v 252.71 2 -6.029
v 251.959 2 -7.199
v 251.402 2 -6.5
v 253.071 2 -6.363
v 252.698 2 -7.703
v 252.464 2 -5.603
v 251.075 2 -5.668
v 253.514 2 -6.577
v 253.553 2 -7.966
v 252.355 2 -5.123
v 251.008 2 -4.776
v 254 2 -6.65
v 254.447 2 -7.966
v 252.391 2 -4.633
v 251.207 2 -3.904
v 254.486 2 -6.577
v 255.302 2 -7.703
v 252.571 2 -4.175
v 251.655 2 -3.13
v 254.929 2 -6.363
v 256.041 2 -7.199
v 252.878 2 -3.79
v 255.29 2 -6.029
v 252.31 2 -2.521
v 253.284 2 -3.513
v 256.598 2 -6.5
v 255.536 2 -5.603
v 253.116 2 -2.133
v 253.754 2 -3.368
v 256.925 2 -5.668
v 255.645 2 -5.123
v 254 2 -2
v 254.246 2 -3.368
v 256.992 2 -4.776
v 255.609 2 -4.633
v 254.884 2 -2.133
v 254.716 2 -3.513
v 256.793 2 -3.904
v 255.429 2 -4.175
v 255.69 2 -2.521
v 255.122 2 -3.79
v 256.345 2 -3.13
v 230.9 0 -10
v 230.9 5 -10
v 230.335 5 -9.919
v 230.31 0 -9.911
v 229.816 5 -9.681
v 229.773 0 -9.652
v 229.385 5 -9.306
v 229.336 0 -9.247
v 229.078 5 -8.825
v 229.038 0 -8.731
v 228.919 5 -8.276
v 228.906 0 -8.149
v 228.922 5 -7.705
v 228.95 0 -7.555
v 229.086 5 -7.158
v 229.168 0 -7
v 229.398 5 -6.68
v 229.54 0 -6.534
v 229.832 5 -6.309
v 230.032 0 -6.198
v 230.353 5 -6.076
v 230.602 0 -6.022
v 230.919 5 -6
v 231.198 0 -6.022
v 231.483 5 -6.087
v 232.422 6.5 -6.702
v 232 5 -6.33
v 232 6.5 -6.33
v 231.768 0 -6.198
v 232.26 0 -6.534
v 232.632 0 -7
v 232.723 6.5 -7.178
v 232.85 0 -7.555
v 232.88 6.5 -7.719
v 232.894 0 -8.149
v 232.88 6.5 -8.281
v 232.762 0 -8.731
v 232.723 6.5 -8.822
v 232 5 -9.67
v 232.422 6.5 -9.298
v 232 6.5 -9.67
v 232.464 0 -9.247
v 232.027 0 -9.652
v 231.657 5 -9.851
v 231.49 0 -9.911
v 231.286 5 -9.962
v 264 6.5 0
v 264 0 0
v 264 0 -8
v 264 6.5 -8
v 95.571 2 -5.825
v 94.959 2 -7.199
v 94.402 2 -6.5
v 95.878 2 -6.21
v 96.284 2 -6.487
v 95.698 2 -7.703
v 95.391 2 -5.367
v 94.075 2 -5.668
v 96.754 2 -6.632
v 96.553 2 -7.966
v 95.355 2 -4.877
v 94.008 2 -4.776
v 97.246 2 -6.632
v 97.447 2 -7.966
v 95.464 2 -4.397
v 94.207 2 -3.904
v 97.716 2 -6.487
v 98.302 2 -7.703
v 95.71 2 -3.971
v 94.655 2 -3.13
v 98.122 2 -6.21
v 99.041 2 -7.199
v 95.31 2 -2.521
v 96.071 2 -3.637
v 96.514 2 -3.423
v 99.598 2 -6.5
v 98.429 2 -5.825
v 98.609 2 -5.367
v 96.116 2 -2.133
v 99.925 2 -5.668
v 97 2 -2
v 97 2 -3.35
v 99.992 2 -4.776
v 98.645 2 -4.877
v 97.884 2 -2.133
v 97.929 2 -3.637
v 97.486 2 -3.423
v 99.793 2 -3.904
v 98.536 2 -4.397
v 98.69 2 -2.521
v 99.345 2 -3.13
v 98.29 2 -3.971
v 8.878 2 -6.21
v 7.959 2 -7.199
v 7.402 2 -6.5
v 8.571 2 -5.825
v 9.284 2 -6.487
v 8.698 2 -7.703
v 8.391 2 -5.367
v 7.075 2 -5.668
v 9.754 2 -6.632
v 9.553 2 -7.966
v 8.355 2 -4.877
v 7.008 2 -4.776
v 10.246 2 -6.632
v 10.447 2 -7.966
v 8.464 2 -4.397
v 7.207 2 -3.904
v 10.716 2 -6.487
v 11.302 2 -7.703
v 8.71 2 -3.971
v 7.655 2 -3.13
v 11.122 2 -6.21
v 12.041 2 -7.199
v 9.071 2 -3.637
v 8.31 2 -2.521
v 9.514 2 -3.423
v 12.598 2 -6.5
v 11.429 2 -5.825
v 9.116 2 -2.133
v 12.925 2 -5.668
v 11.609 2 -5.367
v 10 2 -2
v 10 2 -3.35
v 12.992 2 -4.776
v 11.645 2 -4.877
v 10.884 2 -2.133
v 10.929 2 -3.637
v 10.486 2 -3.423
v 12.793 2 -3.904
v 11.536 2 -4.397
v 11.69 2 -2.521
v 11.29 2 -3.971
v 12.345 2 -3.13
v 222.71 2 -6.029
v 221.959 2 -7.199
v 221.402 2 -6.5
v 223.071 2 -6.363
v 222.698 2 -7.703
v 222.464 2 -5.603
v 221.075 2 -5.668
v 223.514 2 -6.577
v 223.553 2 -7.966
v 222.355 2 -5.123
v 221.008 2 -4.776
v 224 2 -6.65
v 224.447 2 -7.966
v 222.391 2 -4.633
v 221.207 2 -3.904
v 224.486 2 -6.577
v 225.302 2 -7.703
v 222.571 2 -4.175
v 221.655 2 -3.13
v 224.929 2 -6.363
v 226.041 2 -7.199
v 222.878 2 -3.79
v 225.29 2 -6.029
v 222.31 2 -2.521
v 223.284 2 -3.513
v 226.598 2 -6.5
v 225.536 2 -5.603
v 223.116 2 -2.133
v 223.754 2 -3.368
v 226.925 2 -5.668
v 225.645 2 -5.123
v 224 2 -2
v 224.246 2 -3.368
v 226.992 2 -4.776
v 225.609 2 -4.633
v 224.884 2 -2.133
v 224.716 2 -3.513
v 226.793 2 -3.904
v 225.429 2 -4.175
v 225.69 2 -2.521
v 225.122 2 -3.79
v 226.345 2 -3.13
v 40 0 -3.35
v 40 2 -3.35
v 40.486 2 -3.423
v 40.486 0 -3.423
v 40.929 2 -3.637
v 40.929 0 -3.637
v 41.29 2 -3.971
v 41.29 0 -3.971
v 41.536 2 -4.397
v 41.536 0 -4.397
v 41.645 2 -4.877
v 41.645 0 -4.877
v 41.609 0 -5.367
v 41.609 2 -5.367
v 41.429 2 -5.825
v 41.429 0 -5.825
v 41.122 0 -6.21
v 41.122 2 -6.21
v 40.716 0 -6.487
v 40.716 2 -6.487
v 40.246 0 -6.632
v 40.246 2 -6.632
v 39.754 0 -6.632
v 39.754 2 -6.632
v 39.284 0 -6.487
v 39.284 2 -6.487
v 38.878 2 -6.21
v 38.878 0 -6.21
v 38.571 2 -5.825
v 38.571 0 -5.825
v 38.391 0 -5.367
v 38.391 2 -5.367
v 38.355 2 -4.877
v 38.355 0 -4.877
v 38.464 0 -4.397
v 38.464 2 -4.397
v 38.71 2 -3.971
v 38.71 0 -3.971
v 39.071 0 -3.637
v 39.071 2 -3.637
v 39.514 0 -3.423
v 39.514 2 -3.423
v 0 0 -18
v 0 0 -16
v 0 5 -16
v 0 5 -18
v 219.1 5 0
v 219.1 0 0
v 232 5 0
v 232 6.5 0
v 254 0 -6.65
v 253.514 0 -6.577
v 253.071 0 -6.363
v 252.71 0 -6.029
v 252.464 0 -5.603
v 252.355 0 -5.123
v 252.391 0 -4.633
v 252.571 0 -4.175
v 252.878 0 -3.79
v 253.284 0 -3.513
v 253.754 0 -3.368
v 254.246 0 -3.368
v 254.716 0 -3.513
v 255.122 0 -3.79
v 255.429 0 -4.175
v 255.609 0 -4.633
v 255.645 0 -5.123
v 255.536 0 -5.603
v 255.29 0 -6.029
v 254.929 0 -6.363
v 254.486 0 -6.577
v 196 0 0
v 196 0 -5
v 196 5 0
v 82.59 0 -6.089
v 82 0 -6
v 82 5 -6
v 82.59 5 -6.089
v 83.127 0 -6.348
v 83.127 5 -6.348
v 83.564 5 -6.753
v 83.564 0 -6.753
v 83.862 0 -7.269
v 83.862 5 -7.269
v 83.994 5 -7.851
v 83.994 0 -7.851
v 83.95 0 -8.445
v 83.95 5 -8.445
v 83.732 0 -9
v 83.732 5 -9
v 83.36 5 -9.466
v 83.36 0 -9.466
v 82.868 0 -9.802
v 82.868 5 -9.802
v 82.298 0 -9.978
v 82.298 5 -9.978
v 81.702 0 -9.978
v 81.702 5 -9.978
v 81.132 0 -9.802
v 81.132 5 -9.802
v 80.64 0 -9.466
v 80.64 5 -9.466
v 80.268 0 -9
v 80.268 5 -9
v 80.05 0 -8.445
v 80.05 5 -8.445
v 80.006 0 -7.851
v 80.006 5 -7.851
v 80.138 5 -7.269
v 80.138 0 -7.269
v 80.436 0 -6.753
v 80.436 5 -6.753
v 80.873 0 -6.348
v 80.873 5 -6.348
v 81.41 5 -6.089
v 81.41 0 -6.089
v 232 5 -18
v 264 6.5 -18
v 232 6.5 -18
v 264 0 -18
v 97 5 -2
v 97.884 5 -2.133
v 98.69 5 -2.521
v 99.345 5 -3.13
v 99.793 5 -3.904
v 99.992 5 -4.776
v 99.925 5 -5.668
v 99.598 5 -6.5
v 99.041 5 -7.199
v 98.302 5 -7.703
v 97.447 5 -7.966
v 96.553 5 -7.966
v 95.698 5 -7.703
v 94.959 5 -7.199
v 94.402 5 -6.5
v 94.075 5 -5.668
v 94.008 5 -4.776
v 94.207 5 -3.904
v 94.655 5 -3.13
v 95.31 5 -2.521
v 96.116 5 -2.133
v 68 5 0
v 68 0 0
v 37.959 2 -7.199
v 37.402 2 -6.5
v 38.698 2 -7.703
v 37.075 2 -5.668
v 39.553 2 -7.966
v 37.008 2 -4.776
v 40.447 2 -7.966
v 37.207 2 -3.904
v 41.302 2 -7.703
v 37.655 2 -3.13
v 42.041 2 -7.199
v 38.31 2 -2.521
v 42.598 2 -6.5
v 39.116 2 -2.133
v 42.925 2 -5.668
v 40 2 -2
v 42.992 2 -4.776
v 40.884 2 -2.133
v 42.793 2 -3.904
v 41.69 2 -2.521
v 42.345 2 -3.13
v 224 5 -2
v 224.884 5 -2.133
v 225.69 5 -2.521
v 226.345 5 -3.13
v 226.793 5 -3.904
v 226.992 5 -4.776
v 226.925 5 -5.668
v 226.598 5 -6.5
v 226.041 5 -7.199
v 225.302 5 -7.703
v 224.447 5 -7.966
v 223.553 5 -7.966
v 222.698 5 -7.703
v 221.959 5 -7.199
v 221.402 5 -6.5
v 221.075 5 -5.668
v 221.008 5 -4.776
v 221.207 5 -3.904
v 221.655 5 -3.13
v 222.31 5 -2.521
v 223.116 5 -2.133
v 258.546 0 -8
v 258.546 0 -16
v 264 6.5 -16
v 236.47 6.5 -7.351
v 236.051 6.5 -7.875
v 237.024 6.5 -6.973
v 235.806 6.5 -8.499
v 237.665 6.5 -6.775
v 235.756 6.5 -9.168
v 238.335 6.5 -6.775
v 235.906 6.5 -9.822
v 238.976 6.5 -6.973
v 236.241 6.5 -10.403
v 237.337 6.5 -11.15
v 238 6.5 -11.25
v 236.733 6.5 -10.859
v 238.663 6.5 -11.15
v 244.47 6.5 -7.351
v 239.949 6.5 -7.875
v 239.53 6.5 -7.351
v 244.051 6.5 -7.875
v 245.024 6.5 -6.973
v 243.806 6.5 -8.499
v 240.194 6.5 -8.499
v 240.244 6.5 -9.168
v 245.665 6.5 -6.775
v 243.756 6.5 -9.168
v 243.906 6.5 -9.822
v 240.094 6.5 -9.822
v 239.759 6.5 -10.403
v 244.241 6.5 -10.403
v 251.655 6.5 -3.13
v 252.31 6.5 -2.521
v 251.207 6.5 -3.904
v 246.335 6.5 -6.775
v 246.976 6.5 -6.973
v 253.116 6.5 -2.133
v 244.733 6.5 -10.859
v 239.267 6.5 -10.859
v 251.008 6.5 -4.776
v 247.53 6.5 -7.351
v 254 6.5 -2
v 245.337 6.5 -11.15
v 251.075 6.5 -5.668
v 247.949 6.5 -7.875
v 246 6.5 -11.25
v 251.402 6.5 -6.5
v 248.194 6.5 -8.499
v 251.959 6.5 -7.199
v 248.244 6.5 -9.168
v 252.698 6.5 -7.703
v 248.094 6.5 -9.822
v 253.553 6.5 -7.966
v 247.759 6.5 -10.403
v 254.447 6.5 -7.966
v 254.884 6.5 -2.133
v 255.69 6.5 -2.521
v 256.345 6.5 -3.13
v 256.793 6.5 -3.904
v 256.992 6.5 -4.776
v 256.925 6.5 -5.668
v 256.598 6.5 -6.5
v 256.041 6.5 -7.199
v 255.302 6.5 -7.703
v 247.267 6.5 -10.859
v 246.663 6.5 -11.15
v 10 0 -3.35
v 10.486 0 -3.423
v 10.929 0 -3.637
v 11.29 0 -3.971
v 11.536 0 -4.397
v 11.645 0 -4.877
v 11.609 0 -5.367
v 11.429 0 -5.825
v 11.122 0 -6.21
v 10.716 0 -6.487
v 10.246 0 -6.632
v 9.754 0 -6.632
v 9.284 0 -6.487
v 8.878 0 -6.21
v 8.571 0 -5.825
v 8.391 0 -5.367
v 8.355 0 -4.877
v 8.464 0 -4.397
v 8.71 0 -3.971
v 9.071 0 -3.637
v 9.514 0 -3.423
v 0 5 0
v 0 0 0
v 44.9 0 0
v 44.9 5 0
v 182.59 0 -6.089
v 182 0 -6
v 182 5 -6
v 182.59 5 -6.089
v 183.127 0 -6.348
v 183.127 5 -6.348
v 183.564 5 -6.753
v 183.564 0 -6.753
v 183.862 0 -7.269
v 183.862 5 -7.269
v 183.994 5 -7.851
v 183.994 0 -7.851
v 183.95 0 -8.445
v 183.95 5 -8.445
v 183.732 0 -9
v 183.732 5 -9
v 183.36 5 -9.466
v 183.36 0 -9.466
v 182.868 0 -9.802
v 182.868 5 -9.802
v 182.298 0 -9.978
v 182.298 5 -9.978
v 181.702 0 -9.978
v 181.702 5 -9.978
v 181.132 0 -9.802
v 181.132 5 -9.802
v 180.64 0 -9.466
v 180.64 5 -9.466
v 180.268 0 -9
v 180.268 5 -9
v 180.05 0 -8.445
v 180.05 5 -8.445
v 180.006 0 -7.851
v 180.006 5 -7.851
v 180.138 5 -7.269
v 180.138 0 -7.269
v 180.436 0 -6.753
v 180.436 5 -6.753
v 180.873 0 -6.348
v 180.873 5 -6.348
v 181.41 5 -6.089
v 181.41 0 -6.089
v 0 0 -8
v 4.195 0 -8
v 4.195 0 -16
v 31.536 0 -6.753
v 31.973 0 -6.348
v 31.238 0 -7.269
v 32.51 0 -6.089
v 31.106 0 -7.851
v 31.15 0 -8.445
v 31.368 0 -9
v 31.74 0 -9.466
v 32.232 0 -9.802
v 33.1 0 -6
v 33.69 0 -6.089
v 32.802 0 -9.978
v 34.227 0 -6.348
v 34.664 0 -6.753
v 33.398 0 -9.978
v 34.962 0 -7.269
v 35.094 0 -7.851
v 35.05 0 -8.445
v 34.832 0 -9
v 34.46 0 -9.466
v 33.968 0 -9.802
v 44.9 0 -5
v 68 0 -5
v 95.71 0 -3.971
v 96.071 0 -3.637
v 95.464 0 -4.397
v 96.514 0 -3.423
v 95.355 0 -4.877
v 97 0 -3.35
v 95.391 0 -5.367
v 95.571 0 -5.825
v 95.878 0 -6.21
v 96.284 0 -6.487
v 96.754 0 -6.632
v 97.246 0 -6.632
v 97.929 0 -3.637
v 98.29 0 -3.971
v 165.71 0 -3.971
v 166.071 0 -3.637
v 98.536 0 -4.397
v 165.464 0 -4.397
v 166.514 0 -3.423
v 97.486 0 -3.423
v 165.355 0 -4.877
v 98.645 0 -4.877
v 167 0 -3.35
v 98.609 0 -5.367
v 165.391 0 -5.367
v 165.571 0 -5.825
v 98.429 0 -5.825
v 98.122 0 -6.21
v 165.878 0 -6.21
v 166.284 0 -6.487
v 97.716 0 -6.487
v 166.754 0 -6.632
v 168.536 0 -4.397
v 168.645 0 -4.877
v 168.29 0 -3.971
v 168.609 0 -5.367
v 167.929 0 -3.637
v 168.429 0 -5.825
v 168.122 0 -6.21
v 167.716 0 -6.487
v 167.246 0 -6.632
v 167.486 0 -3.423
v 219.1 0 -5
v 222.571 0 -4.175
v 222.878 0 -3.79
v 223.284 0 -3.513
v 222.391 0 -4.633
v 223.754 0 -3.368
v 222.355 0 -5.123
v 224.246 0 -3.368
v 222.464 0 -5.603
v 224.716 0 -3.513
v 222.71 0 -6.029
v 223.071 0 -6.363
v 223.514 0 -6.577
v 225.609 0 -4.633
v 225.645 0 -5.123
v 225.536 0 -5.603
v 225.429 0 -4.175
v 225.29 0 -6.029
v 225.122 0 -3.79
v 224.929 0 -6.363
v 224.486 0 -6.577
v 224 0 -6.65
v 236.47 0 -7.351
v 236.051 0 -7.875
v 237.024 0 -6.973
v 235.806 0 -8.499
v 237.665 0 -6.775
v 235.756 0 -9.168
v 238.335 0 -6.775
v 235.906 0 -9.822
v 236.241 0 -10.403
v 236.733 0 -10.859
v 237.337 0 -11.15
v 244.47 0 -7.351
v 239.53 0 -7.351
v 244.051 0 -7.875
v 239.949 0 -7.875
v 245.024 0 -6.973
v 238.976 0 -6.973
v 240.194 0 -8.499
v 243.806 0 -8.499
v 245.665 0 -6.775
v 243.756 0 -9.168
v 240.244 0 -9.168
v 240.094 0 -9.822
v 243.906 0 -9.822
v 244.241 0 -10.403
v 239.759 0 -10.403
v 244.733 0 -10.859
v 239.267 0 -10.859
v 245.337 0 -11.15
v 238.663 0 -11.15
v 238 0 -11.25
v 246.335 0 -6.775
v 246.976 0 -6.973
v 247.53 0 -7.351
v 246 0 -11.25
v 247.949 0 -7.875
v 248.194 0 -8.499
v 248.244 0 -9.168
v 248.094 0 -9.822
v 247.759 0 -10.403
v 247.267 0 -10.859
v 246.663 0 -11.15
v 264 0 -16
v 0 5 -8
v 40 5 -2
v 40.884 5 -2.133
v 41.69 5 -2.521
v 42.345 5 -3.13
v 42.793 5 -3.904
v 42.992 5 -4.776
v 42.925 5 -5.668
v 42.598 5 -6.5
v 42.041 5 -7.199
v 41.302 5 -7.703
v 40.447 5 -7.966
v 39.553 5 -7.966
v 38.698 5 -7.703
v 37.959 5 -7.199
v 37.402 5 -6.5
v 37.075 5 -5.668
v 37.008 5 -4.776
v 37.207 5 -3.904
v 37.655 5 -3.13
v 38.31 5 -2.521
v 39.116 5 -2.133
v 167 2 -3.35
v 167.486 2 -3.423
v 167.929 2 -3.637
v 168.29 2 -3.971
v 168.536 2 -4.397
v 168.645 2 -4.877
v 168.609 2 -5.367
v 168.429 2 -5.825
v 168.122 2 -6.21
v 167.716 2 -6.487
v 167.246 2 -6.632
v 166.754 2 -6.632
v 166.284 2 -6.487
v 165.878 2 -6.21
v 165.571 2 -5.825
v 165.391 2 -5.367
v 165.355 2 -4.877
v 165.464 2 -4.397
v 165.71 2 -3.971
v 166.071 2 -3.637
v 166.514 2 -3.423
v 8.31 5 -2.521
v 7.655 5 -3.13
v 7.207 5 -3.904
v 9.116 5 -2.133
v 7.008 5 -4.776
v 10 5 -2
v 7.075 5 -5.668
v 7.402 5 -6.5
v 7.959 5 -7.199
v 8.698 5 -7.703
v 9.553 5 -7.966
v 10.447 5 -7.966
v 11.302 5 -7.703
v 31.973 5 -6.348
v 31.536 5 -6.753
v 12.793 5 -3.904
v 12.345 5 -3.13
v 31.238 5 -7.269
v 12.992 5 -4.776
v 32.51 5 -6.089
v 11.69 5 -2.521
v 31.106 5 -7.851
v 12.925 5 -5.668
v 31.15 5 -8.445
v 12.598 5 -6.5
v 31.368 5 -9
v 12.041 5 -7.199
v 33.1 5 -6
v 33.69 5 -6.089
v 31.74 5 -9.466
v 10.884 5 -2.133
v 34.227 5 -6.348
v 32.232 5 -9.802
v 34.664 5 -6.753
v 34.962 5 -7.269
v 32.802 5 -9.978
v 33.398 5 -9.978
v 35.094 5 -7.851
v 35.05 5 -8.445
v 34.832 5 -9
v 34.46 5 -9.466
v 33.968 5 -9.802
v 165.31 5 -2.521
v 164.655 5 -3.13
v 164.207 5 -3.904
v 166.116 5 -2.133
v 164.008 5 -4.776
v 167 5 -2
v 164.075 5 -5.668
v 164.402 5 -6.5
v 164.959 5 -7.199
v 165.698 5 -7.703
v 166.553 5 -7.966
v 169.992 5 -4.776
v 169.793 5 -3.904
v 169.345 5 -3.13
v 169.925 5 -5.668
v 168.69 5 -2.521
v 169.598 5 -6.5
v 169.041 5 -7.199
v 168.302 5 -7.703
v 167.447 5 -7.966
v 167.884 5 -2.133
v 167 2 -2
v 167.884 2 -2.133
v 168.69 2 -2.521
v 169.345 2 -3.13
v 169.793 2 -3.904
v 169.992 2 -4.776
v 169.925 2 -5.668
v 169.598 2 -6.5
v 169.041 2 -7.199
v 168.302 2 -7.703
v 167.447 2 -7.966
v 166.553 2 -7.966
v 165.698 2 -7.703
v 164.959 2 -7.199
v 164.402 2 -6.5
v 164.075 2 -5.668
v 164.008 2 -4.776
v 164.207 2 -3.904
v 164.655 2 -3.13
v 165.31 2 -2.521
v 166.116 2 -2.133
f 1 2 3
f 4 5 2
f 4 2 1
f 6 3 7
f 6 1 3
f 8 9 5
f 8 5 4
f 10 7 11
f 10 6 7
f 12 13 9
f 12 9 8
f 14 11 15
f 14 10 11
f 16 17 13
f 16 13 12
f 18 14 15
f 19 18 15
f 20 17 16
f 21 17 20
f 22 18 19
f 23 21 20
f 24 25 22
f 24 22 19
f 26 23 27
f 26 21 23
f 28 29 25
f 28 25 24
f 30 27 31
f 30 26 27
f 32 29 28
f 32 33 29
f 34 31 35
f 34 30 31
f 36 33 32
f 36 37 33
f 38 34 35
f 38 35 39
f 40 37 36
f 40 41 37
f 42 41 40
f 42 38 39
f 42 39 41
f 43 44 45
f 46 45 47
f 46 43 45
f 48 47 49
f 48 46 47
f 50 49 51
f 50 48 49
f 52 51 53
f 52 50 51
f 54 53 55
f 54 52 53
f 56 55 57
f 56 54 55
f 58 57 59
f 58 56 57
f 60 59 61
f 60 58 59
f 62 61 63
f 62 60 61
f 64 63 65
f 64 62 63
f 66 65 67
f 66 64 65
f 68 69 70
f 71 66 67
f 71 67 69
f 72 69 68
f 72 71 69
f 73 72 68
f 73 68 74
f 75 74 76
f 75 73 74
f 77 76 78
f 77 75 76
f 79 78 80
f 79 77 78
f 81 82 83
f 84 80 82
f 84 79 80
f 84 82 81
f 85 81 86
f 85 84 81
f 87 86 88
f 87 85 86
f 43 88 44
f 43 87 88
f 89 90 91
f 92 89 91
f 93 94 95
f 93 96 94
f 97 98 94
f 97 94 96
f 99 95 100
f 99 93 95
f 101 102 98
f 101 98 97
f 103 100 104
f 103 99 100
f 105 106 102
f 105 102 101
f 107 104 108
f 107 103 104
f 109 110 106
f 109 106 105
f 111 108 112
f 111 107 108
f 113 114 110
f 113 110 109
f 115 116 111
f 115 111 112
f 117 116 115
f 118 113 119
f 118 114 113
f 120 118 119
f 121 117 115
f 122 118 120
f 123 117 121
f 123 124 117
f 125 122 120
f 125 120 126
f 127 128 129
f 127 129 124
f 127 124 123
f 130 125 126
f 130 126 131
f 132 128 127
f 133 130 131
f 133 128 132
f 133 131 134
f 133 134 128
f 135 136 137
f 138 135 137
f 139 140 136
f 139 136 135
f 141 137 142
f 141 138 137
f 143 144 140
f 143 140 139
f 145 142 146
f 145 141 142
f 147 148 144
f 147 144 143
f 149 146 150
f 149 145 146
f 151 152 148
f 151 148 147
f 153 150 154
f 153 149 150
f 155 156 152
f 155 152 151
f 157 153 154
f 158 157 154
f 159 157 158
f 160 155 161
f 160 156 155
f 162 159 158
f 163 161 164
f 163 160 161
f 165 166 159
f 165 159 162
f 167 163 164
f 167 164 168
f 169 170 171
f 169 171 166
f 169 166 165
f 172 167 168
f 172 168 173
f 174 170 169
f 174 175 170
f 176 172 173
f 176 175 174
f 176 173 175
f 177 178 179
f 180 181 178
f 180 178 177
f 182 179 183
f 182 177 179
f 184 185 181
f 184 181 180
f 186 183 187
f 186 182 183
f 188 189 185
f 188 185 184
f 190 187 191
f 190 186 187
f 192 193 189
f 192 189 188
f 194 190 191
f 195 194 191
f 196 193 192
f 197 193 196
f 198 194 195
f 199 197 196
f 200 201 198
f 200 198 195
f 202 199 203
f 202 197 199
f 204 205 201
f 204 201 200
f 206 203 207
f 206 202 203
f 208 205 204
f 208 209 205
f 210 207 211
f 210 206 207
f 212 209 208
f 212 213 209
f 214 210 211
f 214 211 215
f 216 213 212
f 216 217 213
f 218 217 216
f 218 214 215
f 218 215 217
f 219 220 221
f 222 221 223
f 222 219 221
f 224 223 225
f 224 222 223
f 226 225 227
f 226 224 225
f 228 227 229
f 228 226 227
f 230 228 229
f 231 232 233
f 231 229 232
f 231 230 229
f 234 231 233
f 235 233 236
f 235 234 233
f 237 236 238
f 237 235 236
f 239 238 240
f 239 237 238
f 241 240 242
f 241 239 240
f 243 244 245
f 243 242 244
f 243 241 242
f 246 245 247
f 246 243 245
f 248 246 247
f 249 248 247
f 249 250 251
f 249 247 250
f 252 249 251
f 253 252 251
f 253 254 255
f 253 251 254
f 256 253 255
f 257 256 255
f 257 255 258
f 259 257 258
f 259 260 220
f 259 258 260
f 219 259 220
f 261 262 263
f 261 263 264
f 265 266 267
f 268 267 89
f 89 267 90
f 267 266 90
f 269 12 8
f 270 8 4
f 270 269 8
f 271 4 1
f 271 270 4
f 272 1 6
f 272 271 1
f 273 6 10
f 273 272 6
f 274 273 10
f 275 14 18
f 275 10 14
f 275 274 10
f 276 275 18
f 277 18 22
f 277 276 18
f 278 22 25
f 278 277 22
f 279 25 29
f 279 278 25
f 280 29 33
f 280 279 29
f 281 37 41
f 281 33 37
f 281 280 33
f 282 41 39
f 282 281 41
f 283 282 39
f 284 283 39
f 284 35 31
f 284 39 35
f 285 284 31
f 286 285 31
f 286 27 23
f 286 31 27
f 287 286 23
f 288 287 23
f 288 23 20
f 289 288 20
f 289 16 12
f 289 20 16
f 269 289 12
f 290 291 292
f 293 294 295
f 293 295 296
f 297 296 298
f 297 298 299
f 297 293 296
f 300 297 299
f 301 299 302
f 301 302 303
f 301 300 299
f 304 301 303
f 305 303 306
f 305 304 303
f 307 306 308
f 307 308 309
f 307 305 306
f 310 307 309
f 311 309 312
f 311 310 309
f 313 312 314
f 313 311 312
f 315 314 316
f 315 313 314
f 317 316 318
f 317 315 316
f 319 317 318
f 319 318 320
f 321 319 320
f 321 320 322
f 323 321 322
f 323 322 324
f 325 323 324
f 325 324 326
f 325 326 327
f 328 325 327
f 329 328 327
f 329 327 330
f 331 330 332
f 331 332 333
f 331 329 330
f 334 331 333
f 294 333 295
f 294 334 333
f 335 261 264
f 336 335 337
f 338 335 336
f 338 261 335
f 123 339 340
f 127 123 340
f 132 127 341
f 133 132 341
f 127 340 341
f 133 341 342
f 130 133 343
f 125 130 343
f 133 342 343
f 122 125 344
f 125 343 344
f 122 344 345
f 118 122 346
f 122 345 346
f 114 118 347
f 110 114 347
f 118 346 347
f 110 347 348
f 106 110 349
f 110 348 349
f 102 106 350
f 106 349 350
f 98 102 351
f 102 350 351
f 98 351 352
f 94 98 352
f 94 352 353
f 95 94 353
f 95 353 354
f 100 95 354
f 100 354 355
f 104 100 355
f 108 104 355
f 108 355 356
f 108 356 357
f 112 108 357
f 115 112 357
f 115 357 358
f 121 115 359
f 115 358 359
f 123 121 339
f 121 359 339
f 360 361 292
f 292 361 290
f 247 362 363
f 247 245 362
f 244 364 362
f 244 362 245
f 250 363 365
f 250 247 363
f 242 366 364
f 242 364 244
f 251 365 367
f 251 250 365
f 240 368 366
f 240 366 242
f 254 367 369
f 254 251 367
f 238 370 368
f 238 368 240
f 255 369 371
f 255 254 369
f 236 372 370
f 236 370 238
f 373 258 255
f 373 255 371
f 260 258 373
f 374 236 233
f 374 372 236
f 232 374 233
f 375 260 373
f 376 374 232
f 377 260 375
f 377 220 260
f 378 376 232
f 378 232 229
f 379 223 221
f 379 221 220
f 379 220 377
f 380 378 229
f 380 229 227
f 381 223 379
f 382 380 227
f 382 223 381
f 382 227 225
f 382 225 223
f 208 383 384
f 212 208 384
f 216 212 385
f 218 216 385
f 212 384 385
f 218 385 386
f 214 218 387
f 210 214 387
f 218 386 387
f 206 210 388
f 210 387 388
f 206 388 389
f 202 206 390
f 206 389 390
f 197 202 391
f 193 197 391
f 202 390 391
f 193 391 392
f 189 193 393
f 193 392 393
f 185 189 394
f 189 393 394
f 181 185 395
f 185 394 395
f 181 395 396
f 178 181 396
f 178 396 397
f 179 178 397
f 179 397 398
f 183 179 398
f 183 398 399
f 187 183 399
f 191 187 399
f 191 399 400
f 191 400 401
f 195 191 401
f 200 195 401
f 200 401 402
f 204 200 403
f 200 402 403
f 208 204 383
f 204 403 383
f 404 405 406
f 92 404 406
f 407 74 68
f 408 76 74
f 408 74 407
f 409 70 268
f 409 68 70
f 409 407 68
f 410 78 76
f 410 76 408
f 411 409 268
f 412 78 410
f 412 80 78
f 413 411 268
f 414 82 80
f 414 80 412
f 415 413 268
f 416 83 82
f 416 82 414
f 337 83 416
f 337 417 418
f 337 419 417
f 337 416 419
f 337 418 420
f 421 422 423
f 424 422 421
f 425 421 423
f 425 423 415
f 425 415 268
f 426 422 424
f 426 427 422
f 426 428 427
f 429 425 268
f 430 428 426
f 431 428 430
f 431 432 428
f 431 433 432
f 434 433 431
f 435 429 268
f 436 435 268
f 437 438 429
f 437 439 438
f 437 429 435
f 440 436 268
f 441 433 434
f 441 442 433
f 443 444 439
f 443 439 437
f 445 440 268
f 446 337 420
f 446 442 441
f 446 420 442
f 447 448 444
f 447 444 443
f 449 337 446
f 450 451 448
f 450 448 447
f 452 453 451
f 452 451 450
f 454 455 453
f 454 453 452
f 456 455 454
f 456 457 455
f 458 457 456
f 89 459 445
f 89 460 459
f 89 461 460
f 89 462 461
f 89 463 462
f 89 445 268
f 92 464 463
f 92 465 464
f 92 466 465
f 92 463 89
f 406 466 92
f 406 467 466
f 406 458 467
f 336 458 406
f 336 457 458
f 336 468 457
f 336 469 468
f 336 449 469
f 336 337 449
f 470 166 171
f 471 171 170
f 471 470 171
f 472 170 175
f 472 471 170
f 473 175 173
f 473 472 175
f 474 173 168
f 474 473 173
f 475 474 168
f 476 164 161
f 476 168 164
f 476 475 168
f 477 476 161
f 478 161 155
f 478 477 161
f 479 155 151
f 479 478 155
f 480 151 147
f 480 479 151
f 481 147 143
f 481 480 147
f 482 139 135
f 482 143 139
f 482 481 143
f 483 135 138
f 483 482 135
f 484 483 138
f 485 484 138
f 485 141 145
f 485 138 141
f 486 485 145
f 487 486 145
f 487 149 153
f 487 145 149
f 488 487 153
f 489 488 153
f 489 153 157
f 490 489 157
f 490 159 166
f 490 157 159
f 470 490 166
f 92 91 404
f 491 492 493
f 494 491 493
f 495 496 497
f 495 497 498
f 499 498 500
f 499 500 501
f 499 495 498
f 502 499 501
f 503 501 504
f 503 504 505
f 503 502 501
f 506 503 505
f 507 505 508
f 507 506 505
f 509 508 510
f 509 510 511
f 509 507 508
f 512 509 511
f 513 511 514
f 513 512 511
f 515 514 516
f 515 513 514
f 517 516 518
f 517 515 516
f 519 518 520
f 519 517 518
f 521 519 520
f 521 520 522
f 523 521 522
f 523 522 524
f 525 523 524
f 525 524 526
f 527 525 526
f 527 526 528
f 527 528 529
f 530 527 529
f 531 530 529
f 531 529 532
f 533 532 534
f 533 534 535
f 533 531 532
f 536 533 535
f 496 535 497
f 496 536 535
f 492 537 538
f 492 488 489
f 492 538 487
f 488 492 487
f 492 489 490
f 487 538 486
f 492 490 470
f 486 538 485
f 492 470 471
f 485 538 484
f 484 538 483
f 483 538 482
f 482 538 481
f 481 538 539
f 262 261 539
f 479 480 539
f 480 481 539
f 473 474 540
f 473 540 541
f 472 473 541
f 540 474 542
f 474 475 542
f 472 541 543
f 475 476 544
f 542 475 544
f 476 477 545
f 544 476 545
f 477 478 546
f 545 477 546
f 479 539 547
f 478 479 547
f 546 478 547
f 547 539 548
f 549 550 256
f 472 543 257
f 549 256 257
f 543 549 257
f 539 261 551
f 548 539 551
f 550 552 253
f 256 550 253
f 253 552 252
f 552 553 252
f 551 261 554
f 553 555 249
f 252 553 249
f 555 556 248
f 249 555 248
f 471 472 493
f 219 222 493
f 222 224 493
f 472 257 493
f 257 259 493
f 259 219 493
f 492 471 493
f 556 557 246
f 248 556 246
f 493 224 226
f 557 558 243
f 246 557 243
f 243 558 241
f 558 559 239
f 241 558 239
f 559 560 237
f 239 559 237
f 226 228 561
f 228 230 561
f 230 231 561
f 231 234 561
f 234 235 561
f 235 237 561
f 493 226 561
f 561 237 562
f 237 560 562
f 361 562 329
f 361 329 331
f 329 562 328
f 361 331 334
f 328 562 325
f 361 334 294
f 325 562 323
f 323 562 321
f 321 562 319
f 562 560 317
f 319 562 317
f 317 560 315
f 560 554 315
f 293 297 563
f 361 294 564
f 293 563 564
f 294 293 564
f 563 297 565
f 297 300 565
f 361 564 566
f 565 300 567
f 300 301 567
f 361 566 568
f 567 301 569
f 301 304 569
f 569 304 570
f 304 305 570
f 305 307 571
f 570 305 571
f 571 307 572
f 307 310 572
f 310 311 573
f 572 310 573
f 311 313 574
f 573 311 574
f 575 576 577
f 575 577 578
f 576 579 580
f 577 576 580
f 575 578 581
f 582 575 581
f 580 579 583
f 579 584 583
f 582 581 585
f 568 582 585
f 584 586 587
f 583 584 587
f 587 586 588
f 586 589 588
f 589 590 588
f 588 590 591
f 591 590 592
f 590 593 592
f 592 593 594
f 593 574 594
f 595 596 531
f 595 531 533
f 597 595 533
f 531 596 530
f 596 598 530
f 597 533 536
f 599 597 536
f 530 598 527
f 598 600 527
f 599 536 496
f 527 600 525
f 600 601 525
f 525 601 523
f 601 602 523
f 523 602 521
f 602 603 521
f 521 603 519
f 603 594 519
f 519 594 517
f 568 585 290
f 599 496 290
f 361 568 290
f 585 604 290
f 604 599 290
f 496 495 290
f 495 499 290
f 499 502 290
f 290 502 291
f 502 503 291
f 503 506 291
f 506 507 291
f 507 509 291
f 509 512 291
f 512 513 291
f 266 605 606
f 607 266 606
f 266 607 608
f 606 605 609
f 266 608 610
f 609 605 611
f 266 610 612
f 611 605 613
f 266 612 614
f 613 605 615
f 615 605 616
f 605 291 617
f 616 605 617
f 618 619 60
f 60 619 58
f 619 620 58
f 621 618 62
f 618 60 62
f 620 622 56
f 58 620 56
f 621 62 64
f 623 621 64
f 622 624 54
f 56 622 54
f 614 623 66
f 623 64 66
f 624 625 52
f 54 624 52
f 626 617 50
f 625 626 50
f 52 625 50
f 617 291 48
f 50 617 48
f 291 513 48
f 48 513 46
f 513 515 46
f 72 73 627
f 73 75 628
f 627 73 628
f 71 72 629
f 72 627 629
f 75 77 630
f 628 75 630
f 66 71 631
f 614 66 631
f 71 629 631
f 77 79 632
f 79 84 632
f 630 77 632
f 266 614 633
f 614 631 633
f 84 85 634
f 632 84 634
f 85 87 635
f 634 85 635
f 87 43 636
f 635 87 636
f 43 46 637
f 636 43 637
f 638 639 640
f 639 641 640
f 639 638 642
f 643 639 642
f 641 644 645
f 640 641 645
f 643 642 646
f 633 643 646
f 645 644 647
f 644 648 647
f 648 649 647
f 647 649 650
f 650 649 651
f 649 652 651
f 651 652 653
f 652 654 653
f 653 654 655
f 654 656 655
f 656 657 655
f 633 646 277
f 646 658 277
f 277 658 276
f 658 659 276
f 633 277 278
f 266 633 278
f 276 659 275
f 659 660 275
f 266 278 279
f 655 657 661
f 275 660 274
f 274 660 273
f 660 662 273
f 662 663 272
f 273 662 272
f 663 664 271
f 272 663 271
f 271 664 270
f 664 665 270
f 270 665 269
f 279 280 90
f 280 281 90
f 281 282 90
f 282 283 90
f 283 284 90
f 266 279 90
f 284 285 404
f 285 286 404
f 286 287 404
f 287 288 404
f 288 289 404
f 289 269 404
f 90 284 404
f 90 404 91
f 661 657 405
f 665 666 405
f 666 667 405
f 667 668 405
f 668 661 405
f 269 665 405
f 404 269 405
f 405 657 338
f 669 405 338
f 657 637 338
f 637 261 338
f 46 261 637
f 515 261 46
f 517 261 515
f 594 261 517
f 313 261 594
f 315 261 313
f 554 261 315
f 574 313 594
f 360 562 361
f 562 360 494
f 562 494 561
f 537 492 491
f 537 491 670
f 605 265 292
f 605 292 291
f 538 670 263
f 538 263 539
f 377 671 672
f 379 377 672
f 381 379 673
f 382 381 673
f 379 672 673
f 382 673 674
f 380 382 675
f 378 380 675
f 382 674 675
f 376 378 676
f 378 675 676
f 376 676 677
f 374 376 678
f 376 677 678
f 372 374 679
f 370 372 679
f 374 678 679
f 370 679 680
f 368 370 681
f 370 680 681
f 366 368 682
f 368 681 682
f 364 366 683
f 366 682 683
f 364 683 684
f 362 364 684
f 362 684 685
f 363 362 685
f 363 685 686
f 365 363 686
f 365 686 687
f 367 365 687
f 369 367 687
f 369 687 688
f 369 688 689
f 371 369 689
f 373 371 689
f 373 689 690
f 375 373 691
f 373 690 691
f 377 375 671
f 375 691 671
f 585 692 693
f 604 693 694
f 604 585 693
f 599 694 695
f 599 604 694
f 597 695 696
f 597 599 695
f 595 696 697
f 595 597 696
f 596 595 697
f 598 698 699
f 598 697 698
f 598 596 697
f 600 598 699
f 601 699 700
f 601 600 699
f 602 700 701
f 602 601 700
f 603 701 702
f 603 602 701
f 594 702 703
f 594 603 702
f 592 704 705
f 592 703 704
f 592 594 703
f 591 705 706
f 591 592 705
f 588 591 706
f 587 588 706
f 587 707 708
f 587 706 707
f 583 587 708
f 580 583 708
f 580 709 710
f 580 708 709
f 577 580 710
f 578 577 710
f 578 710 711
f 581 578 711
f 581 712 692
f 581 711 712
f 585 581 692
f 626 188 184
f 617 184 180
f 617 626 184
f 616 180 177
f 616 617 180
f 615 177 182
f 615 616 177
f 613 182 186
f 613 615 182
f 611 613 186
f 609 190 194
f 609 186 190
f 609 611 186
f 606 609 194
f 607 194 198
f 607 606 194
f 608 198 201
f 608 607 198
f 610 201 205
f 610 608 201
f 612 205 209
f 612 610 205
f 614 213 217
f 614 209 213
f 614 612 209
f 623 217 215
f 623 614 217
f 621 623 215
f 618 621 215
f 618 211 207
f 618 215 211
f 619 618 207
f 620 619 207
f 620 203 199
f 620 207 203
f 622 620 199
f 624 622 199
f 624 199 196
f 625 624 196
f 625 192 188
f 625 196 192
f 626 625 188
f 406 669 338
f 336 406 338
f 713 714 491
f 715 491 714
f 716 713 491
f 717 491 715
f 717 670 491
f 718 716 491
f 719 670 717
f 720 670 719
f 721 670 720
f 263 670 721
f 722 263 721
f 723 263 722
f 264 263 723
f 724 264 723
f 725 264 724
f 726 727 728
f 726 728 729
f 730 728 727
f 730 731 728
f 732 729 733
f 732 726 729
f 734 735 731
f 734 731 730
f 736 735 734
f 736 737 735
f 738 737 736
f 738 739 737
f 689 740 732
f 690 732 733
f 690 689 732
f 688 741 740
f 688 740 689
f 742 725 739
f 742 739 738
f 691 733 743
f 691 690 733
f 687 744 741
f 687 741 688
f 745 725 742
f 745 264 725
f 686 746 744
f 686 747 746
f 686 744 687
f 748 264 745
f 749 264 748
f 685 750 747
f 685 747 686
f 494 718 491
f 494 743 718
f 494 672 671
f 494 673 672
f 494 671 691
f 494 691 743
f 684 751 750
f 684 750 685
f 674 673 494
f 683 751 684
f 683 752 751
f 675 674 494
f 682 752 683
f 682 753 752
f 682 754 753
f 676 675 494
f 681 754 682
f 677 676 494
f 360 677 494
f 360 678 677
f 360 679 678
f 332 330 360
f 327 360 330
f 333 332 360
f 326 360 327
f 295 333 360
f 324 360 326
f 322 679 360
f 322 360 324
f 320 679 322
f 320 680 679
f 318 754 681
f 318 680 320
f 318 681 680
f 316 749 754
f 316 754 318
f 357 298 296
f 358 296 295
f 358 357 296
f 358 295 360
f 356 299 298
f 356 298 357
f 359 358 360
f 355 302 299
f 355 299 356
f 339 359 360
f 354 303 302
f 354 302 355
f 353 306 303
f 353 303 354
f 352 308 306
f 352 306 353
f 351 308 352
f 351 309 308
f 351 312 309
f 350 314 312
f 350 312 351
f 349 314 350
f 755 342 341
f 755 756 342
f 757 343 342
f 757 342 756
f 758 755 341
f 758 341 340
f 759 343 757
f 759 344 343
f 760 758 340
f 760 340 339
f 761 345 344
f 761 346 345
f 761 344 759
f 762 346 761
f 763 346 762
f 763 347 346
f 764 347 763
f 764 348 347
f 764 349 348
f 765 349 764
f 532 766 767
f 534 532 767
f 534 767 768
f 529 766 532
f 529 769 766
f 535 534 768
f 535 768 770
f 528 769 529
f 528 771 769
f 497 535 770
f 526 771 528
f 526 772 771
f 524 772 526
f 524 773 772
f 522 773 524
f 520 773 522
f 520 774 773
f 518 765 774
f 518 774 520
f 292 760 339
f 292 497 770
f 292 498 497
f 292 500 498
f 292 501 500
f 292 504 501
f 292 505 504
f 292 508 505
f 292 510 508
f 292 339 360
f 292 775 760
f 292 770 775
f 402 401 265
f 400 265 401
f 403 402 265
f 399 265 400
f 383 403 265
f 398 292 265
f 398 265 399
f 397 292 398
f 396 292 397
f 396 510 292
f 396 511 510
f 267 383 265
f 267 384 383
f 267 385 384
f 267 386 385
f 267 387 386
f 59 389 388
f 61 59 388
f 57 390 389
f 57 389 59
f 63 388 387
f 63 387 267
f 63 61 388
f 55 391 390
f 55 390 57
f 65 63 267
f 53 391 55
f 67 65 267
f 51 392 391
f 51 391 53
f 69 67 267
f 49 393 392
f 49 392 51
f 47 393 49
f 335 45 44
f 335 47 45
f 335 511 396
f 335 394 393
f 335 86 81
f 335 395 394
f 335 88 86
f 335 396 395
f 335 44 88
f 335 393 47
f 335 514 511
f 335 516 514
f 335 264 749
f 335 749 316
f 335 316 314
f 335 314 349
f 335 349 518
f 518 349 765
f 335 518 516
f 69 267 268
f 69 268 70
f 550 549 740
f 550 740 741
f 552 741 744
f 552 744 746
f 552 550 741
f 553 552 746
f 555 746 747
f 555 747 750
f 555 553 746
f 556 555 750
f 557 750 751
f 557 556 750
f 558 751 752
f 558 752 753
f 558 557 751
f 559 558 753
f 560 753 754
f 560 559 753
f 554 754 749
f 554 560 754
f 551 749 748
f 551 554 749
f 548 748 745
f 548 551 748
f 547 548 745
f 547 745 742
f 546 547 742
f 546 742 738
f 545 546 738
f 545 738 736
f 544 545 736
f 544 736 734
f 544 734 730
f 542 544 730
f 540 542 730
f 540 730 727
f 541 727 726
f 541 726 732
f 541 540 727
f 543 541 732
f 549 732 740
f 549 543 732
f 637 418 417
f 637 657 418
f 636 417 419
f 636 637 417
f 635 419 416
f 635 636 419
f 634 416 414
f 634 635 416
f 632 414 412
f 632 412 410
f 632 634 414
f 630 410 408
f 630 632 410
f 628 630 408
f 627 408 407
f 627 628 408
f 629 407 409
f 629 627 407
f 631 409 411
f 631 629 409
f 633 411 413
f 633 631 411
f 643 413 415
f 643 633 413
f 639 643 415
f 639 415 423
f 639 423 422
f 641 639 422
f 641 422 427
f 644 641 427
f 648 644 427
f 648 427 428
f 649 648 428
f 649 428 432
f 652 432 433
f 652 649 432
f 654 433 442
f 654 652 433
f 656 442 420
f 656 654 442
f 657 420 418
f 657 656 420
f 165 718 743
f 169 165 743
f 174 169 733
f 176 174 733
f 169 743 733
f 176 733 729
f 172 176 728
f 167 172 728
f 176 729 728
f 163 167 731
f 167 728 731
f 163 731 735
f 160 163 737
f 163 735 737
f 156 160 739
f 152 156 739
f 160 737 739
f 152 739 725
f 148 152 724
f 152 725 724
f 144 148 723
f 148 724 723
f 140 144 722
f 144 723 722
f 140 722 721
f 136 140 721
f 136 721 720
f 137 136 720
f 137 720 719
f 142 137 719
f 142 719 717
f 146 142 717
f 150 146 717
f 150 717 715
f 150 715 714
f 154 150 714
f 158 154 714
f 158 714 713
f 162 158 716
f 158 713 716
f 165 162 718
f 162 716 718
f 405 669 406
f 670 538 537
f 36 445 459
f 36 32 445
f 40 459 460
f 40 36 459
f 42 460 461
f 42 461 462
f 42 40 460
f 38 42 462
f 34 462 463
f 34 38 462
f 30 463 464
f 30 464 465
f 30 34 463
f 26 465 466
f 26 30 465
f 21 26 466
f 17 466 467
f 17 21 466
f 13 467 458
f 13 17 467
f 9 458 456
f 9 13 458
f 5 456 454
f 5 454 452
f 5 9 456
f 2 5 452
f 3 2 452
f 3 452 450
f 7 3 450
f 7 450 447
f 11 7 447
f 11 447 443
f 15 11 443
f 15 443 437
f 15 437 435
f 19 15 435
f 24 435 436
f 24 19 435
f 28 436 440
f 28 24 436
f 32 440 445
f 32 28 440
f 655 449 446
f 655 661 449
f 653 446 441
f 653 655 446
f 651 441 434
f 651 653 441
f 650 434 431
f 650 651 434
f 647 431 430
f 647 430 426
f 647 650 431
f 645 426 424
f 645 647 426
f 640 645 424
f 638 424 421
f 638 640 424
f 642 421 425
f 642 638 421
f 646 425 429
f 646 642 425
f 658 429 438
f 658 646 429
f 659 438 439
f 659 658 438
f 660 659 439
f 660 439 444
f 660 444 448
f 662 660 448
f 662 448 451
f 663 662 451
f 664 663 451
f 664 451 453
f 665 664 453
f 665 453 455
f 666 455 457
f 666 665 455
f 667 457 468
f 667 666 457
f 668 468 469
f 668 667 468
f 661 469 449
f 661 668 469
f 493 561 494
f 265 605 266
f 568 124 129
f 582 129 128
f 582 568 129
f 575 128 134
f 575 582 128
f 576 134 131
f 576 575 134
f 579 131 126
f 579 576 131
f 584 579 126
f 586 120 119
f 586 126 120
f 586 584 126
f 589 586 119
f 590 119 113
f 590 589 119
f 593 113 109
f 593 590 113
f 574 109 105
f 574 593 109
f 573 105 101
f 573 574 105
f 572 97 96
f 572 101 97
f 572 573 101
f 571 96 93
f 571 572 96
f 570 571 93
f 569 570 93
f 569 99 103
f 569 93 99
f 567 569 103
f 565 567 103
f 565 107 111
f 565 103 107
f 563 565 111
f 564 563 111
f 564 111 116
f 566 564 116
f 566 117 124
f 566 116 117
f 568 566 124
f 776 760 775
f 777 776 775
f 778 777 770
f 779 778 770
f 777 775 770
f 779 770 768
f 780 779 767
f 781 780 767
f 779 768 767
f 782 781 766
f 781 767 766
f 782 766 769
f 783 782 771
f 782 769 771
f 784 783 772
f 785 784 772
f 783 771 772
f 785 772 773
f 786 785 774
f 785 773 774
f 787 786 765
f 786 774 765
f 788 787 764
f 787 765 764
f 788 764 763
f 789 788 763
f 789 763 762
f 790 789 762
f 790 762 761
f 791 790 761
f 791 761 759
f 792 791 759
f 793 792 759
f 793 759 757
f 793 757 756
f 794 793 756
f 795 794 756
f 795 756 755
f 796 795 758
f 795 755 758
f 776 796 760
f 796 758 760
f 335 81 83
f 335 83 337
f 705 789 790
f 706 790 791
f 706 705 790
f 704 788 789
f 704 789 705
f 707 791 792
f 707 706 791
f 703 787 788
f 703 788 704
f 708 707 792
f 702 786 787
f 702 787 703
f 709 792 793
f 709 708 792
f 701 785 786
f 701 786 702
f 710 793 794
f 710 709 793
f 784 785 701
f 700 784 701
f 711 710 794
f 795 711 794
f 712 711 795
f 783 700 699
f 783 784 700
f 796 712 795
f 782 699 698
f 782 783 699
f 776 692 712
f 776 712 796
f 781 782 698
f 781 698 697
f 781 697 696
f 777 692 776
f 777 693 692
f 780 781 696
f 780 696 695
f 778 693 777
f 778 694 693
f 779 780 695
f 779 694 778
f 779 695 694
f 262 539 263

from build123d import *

# Parameters (mm, degrees)
SKIZZE1_W                       = 264
SKIZZE1_H                       = 18
SKIZZE1_R                       = 1.65
SKIZZE1_R_2                     = 2.25
SKIZZE1_R_3                     = 2
AUFSATZ_LINEAR_AUSTRAGEN1_DEPTH = 5
SCHNITT_LINEAR_START            = -2
SCHNITT_LINEAR_AUSTRAGEN1_DEPTH = 8
SCHNITT_LINEAR_START_2          = -44.9
SCHNITT_LINEAR_AUSTRAGEN2_DEPTH = 23.1
SCHNITT_LINEAR_AUSTRAGEN3_DEPTH = 23.1
SKIZZE5_R                       = 3
SCHNITT_LINEAR_AUSTRAGEN4_DEPTH = 3
SKIZZE7_W                       = 32
SKIZZE7_H                       = 18
SKIZZE7_R                       = 2.25
SKIZZE7_R_2                     = 3
AUFSATZ_LINEAR_AUSTRAGEN3_DEPTH = 1.5
AUFSATZ_LINEAR_START            = -5
SKIZZE8_R                       = 2.25
AUFSATZ_LINEAR_AUSTRAGEN4_DEPTH = 5
SCHNITT_LINEAR_AUSTRAGEN6_DEPTH = 8
SKIZZE10_R                      = 2
SCHNITT_LINEAR_AUSTRAGEN7_DEPTH = 1.5


with BuildPart() as part:
    # Skizze1 → Aufsatz-Linear austragen1 (new body)
    with BuildSketch(Plane(origin=(0, 0, 0), x_dir=(1, 0, 0), z_dir=(0, 1, 0))):
        with Locations((132, 9)):
            Rectangle(SKIZZE1_W, SKIZZE1_H)
        with Locations(Location((10, 5, 0), (0, 0, 270))):
            Circle(SKIZZE1_R, mode=Mode.SUBTRACT)
        with Locations(Location((40, 5, 0), (0, 0, 270))):
            Circle(SKIZZE1_R, mode=Mode.SUBTRACT)
        with Locations(Location((26, 9, 0), (0, 0, 270))):
            Circle(SKIZZE1_R_2, mode=Mode.SUBTRACT)
        with Locations(Location((18, 9, 0), (0, 0, 270))):
            Circle(SKIZZE1_R_2, mode=Mode.SUBTRACT)
        with Locations(Location((224, 5, 0), (0, 0, 90))):
            Circle(SKIZZE1_R, mode=Mode.SUBTRACT)
        with Locations(Location((254, 5, 0), (0, 0, 90))):
            Circle(SKIZZE1_R, mode=Mode.SUBTRACT)
        with Locations(Location((246, 9, 0), (0, 0, 90))):
            Circle(SKIZZE1_R_2, mode=Mode.SUBTRACT)
        with Locations(Location((238, 9, 0), (0, 0, 90))):
            Circle(SKIZZE1_R_2, mode=Mode.SUBTRACT)
        with Locations(Location((230.9, 8, 0), (0, 0, 90))):
            Circle(SKIZZE1_R_3, mode=Mode.SUBTRACT)
        with Locations(Location((33.1, 8, 0), (0, 0, 270))):
            Circle(SKIZZE1_R_3, mode=Mode.SUBTRACT)
        with Locations(Location((97, 5, 0), (0, 0, 270))):
            Circle(SKIZZE1_R, mode=Mode.SUBTRACT)
        with Locations(Location((167, 5, 0), (0, 0, 270))):
            Circle(SKIZZE1_R, mode=Mode.SUBTRACT)
        with Locations(Location((82, 8, 0), (0, 0, 270))):
            Circle(SKIZZE1_R_3, mode=Mode.SUBTRACT)
        with Locations(Location((182, 8, 0), (0, 0, 270))):
            Circle(SKIZZE1_R_3, mode=Mode.SUBTRACT)
    extrude(amount=AUFSATZ_LINEAR_AUSTRAGEN1_DEPTH)

    # Skizze2 → Schnitt-Linear austragen1 (cut)
    with BuildSketch(Plane(origin=(0, 0, -18), x_dir=(-1, 0, 0), z_dir=(0, 0, -1)).offset(SCHNITT_LINEAR_START)):
        Polygon((-4.195498156, 0), (0, 0), (0, 5), align=None)
        Polygon((-264, 0), (-259.804501844, 0), (-264, 5), align=None)
    extrude(amount=-SCHNITT_LINEAR_AUSTRAGEN1_DEPTH, mode=Mode.SUBTRACT)

    # Skizze3 → Schnitt-Linear austragen2 (cut)
    with BuildSketch(Plane.ZY.offset(SCHNITT_LINEAR_START_2)):
        Polygon((0, 5), (-5, 0), (0, 0), align=None)
    extrude(amount=-SCHNITT_LINEAR_AUSTRAGEN2_DEPTH, mode=Mode.SUBTRACT)

    # Skizze4 → Schnitt-Linear austragen3 (cut)
    with BuildSketch(Plane(origin=(264, 0, 0), x_dir=(0, 0, -1), z_dir=(1, 0, 0)).offset(SCHNITT_LINEAR_START_2)):
        Polygon((0, 5), (5, 0), (0, 0), align=None)
    extrude(amount=-SCHNITT_LINEAR_AUSTRAGEN3_DEPTH, mode=Mode.SUBTRACT)

    # Skizze5 → Schnitt-Linear austragen4 (cut)
    with BuildSketch(Plane(origin=(0, 5, 0), x_dir=(1, 0, 0), z_dir=(0, 1, 0))):
        with Locations(Location((254, 5, 0), (0, 0, 270))):
            Circle(SKIZZE5_R)
        with Locations(Location((224, 5, 0), (0, 0, 270))):
            Circle(SKIZZE5_R)
        with Locations(Location((40, 5, 0), (0, 0, 270))):
            Circle(SKIZZE5_R)
        with Locations(Location((10, 5, 0), (0, 0, 270))):
            Circle(SKIZZE5_R)
        with Locations(Location((97, 5, 0), (0, 0, 270))):
            Circle(SKIZZE5_R)
        with Locations(Location((167, 5, 0), (0, 0, 270))):
            Circle(SKIZZE5_R)
    extrude(amount=-SCHNITT_LINEAR_AUSTRAGEN4_DEPTH, mode=Mode.SUBTRACT)

    # Skizze7 → Aufsatz-Linear austragen3 (add)
    with BuildSketch(Plane(origin=(0, 5, 0), x_dir=(1, 0, 0), z_dir=(0, 1, 0))):
        with Locations((248, 9)):
            Rectangle(SKIZZE7_W, SKIZZE7_H)
        with Locations(Location((238, 9, 0), (0, 0, 90))):
            Circle(SKIZZE7_R, mode=Mode.SUBTRACT)
        with Locations(Location((246, 9, 0), (0, 0, 90))):
            Circle(SKIZZE7_R, mode=Mode.SUBTRACT)
        with Locations(Location((254, 5, 0), (0, 0, 270))):
            Circle(SKIZZE7_R_2, mode=Mode.SUBTRACT)
    extrude(amount=AUFSATZ_LINEAR_AUSTRAGEN3_DEPTH)

    # Skizze8 → Aufsatz-Linear austragen4 (add)
    with BuildSketch(Plane(origin=(0, 5, 0), x_dir=(1, 0, 0), z_dir=(0, 1, 0)).offset(AUFSATZ_LINEAR_START)):
        with Locations((18, 9)):
            Circle(SKIZZE8_R)
        with Locations((26, 9)):
            Circle(SKIZZE8_R)
    extrude(amount=AUFSATZ_LINEAR_AUSTRAGEN4_DEPTH)

    # Skizze9 → Schnitt-Linear austragen6 (cut)
    with BuildSketch(Plane(origin=(0, 0, -18), x_dir=(-1, 0, 0), z_dir=(0, 0, -1)).offset(SCHNITT_LINEAR_START)):
        Polygon((-264, 6.5), (-264, 0), (-258.545852397, 0), align=None)
    extrude(amount=-SCHNITT_LINEAR_AUSTRAGEN6_DEPTH, mode=Mode.SUBTRACT)

    # Skizze10 → Schnitt-Linear austragen7 (cut)
    with BuildSketch(Plane(origin=(0, 5, 0), x_dir=(1, 0, 0), z_dir=(0, 1, 0))):
        with Locations(Location((230.9, 8, 0), (0, 0, 90))):
            Circle(SKIZZE10_R)
    extrude(amount=SCHNITT_LINEAR_AUSTRAGEN7_DEPTH, mode=Mode.SUBTRACT)


solid = part.part
